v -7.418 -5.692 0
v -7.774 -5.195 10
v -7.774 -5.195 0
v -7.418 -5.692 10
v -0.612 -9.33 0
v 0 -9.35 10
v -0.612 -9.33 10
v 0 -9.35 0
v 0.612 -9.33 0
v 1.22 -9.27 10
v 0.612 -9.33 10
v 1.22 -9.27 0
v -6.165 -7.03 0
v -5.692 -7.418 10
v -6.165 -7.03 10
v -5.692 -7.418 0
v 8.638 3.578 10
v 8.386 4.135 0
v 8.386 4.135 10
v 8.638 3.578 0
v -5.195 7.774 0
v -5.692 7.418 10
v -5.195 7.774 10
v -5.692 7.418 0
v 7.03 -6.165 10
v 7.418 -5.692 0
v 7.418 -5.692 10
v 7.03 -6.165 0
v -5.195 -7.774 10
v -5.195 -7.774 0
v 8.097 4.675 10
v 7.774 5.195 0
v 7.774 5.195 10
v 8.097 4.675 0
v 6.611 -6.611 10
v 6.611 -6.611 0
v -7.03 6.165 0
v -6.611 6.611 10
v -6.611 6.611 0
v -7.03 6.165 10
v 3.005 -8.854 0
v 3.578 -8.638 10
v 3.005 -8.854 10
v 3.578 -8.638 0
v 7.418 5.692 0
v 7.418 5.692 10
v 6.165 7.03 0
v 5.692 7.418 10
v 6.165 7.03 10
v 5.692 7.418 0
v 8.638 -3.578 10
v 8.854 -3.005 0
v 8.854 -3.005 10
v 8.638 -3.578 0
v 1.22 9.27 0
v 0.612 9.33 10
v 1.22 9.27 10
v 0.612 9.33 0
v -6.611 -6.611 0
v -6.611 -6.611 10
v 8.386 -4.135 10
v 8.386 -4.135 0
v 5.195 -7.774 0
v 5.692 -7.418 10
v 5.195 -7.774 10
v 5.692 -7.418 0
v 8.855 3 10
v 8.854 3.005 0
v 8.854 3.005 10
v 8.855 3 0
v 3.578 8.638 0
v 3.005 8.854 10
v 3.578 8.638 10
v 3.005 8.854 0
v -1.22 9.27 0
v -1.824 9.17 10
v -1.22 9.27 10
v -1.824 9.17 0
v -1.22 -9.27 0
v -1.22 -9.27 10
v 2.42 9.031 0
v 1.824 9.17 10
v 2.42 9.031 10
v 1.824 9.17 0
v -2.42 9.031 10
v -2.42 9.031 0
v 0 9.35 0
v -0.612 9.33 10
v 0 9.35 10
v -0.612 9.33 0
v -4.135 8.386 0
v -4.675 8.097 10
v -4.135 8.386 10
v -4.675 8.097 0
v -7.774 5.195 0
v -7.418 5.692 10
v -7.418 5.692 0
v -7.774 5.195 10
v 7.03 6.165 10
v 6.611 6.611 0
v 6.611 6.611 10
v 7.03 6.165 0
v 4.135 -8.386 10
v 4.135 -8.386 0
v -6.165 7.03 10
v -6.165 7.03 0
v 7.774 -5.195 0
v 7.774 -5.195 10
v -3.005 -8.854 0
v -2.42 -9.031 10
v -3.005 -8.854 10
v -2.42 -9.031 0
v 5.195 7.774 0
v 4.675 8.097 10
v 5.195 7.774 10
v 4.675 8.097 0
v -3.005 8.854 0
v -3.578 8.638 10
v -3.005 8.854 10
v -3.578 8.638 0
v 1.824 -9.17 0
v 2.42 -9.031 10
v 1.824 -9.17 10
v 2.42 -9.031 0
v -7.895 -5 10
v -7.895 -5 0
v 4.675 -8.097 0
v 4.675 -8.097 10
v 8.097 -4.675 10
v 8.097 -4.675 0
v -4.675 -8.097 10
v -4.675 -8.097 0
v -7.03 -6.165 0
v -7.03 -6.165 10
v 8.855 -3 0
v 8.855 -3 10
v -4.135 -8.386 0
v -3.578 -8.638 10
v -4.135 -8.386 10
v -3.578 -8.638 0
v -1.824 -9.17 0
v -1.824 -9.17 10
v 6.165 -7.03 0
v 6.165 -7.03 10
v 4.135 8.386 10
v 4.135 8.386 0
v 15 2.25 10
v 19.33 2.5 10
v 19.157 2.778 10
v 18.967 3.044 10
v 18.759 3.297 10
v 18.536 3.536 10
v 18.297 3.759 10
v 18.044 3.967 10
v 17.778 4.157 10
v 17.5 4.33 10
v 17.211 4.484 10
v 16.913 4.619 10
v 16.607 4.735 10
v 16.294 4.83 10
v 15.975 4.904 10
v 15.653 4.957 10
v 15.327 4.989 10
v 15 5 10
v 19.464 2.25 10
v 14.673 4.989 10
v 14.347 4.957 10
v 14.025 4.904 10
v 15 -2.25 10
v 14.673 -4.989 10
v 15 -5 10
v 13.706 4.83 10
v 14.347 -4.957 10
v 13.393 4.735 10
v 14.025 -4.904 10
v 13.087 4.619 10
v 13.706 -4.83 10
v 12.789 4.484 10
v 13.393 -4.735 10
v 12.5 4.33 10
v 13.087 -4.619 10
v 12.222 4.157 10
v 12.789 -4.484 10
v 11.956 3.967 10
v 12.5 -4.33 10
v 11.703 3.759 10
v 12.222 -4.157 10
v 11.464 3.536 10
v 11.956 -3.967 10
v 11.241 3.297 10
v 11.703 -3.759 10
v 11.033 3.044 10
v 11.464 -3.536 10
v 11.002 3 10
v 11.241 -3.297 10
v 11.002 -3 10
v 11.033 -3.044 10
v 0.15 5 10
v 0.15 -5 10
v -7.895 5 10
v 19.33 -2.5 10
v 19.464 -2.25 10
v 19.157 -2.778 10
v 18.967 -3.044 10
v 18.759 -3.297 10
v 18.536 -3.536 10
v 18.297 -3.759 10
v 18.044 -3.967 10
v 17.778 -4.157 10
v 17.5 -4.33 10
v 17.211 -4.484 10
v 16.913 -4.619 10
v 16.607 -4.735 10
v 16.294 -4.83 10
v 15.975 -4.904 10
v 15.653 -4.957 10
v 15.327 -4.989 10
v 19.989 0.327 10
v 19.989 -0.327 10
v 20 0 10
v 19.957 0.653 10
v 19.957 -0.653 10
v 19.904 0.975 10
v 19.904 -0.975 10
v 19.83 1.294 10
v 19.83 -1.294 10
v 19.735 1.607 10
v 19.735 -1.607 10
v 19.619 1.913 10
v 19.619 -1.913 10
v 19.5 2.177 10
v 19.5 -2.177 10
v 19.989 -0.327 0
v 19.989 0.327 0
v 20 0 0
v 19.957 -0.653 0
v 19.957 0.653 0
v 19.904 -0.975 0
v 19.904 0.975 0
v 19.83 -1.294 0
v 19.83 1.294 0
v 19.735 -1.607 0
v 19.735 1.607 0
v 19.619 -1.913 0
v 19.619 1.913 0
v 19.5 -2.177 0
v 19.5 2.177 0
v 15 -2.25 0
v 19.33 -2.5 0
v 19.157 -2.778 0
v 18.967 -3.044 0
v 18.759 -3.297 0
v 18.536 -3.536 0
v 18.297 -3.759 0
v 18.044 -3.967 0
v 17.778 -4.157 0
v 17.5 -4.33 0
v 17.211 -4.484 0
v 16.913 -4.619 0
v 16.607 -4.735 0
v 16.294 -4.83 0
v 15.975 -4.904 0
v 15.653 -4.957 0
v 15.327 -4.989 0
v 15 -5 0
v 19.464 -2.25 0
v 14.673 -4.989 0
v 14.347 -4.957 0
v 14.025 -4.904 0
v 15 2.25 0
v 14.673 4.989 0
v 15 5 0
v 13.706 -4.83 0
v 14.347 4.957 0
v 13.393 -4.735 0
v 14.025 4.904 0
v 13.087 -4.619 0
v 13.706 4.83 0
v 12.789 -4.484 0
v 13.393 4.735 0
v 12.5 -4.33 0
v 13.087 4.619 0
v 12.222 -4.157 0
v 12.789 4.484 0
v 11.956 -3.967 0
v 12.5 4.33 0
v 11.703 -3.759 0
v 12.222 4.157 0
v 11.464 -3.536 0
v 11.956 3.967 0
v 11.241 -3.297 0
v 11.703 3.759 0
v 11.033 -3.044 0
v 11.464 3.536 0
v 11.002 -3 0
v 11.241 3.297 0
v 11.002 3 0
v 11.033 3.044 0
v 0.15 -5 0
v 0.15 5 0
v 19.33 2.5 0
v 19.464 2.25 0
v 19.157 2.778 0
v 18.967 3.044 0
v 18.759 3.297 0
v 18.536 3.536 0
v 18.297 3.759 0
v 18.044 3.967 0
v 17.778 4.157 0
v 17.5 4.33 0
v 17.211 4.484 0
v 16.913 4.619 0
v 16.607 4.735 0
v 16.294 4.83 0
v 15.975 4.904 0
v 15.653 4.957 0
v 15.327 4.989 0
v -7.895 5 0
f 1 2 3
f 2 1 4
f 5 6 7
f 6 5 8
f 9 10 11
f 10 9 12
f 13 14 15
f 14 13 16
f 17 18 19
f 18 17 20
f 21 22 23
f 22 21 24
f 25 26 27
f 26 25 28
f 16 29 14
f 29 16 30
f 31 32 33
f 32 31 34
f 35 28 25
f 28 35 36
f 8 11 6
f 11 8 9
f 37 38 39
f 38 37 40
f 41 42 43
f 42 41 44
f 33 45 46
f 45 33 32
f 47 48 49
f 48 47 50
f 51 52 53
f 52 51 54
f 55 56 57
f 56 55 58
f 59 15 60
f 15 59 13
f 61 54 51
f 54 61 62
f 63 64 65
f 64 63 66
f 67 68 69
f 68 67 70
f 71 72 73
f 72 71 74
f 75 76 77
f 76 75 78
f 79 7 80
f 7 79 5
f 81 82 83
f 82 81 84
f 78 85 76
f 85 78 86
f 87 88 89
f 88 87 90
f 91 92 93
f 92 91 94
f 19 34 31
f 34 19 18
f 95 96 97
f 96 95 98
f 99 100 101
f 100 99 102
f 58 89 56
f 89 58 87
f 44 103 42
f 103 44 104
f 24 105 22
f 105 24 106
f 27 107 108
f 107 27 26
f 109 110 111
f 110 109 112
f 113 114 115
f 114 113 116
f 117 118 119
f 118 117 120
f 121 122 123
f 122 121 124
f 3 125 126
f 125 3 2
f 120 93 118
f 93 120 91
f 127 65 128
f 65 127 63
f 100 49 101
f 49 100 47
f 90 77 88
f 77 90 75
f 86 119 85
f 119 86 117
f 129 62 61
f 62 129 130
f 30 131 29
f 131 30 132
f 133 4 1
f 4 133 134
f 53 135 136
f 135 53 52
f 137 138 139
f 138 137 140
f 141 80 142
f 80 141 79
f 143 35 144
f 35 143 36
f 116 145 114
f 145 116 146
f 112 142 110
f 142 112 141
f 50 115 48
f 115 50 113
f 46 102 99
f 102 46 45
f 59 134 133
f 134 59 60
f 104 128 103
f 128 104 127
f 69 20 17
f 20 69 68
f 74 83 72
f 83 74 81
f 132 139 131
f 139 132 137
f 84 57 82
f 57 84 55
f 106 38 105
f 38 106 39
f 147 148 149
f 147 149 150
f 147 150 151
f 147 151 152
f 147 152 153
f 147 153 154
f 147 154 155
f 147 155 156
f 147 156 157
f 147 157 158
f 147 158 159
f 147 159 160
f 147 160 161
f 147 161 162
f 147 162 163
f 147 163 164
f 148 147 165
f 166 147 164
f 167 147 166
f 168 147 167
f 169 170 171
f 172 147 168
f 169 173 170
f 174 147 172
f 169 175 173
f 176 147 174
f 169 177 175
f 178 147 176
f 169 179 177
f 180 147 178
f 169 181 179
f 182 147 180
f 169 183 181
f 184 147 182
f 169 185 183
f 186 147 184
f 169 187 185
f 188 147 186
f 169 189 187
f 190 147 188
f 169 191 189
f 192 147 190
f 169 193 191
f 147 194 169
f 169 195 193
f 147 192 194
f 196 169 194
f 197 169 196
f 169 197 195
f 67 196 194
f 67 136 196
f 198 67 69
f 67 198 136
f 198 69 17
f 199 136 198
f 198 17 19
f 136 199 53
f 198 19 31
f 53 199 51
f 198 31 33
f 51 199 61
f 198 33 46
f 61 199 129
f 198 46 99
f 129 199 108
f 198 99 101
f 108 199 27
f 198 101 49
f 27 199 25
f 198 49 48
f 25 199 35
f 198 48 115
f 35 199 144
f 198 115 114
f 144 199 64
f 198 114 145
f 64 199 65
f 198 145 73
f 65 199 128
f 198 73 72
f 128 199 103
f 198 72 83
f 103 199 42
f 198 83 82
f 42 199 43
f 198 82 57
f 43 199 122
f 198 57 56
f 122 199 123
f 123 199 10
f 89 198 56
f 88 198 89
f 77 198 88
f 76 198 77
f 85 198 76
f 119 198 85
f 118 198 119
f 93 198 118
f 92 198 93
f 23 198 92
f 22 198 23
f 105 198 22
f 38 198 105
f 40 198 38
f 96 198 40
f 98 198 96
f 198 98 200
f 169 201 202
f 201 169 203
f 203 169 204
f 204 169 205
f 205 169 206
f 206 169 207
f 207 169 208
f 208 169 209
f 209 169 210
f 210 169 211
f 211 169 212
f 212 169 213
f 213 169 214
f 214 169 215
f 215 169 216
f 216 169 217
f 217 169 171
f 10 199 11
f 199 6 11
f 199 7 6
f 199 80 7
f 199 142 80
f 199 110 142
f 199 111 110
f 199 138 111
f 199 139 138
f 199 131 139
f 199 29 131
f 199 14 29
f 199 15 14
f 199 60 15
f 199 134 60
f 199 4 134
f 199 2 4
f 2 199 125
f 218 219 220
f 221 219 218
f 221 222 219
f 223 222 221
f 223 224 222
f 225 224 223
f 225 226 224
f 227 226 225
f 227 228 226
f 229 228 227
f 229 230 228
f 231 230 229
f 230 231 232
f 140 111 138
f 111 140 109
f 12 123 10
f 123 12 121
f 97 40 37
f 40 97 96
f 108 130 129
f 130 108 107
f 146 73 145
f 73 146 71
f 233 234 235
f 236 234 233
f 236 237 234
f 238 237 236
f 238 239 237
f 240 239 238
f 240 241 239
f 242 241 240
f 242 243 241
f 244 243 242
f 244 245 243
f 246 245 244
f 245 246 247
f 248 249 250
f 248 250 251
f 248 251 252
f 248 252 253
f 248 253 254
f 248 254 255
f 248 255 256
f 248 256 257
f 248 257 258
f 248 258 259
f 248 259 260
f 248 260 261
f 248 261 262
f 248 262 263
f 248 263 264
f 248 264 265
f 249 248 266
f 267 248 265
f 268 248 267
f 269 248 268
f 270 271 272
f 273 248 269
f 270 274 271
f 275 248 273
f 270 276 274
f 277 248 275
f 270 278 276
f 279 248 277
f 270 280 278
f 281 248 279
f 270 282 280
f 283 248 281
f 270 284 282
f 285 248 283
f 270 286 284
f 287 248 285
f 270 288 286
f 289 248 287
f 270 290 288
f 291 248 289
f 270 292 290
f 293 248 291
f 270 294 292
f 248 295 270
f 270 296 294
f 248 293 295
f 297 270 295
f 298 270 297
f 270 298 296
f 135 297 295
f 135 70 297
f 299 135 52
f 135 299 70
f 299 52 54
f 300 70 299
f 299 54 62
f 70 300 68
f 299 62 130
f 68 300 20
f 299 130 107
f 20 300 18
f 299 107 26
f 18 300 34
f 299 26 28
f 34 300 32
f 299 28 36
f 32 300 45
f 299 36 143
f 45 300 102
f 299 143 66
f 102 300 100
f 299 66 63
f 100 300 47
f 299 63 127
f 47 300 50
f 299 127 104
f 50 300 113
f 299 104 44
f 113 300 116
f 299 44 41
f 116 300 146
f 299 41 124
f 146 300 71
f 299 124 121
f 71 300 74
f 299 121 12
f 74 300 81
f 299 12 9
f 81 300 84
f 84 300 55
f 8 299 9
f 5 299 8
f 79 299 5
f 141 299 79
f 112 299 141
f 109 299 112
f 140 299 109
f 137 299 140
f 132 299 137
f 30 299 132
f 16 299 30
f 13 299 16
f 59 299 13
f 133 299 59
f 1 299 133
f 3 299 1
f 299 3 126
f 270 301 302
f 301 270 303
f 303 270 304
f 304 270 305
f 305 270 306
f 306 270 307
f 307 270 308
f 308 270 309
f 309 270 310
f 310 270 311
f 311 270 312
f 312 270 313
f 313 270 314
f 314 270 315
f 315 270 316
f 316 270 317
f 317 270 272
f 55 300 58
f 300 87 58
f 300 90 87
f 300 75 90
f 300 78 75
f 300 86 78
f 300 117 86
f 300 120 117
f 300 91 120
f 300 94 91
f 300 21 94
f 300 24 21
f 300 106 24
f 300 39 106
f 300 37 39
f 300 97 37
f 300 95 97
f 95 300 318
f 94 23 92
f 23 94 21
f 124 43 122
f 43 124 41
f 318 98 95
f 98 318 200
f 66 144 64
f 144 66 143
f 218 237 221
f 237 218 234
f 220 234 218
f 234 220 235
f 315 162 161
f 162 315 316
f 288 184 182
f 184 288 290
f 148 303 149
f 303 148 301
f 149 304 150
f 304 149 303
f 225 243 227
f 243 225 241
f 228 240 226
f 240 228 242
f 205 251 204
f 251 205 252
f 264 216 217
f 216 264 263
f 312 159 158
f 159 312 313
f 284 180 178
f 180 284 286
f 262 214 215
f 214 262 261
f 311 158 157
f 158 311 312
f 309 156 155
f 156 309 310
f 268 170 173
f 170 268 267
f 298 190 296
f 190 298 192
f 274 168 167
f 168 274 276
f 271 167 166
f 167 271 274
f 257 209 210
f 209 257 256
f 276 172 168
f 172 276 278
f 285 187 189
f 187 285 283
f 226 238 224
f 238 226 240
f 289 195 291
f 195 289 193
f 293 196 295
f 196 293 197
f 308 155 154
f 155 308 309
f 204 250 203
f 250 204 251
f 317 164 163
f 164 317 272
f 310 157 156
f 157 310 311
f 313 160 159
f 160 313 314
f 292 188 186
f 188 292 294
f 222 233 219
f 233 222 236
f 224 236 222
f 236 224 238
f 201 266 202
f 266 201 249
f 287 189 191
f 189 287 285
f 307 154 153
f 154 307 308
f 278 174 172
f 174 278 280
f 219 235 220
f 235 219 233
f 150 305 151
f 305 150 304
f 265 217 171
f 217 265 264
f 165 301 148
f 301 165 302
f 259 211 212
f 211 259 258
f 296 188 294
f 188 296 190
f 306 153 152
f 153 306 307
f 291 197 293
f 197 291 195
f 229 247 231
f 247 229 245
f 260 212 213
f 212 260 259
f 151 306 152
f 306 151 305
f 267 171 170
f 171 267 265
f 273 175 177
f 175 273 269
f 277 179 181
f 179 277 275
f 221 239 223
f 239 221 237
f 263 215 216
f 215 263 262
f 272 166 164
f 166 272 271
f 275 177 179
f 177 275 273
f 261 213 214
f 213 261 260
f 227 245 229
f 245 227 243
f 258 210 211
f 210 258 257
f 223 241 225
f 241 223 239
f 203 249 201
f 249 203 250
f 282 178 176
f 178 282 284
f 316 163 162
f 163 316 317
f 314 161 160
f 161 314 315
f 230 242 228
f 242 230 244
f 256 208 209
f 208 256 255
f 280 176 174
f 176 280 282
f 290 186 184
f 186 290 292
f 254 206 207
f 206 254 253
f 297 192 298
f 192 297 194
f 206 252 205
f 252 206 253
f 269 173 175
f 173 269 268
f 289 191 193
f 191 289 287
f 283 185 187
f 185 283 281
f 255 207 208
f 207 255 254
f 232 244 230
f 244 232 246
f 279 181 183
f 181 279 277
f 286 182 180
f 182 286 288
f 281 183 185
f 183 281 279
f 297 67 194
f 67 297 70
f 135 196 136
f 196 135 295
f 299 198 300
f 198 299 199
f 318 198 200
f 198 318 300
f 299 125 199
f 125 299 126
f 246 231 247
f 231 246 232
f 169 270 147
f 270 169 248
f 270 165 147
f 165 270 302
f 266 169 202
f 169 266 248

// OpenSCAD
// Tubing clip for 12.7 mm (1/2 inch) lab stand rod
// Print orientation: flat on bed, builds up in +Z

// ---- Parameters ----
stand_d      = 12.7;   // stand rod inner diameter
stand_wall   = 3;      // stand ring wall thickness
stand_od     = stand_d + 2 * stand_wall;  // stand ring outer diameter (18.7)

tube_d       = 6;      // tubing inner diameter
tube_wall    = 2;      // tubing ring wall thickness
tube_od      = tube_d + 2 * tube_wall;    // tubing ring outer diameter (10)

bridge_w     = 6;      // bridge width in Y
bridge_x0    = 8;      // bridge start in X
bridge_x1    = 12;     // bridge end in X

opening1_w   = 10;     // stand ring opening width (X < 0, -5 < y < 5)
opening2_w   = 4.5;    // tubing ring opening width (X > 15, -2.25 < y < 2.25)

eps          = 0.5;    // cutter overshoot past faces
$fn          = 96;     // curve resolution

// ---- Model ----
height = 10;  // extrusion height in Z

difference() {
    union() {
        // Stand ring
        cylinder(d = stand_od, h = height);
        // Tubing ring
        translate([15, 0, 0]) cylinder(d = tube_od, h = height);
        // Solid bridge
        translate([bridge_x0, -bridge_w/2, 0])
            cube([bridge_x1 - bridge_x0, bridge_w, height]);
    }
    // Stand ring opening
    translate([-stand_od/2 - eps, -opening1_w/2, -eps])
        cube([opening1_w, opening1_w, height + 2*eps]);
    // Tubing ring opening
    translate([15, -opening2_w/2, -eps])
        cube([opening2_w, opening2_w, height + 2*eps]);
}
